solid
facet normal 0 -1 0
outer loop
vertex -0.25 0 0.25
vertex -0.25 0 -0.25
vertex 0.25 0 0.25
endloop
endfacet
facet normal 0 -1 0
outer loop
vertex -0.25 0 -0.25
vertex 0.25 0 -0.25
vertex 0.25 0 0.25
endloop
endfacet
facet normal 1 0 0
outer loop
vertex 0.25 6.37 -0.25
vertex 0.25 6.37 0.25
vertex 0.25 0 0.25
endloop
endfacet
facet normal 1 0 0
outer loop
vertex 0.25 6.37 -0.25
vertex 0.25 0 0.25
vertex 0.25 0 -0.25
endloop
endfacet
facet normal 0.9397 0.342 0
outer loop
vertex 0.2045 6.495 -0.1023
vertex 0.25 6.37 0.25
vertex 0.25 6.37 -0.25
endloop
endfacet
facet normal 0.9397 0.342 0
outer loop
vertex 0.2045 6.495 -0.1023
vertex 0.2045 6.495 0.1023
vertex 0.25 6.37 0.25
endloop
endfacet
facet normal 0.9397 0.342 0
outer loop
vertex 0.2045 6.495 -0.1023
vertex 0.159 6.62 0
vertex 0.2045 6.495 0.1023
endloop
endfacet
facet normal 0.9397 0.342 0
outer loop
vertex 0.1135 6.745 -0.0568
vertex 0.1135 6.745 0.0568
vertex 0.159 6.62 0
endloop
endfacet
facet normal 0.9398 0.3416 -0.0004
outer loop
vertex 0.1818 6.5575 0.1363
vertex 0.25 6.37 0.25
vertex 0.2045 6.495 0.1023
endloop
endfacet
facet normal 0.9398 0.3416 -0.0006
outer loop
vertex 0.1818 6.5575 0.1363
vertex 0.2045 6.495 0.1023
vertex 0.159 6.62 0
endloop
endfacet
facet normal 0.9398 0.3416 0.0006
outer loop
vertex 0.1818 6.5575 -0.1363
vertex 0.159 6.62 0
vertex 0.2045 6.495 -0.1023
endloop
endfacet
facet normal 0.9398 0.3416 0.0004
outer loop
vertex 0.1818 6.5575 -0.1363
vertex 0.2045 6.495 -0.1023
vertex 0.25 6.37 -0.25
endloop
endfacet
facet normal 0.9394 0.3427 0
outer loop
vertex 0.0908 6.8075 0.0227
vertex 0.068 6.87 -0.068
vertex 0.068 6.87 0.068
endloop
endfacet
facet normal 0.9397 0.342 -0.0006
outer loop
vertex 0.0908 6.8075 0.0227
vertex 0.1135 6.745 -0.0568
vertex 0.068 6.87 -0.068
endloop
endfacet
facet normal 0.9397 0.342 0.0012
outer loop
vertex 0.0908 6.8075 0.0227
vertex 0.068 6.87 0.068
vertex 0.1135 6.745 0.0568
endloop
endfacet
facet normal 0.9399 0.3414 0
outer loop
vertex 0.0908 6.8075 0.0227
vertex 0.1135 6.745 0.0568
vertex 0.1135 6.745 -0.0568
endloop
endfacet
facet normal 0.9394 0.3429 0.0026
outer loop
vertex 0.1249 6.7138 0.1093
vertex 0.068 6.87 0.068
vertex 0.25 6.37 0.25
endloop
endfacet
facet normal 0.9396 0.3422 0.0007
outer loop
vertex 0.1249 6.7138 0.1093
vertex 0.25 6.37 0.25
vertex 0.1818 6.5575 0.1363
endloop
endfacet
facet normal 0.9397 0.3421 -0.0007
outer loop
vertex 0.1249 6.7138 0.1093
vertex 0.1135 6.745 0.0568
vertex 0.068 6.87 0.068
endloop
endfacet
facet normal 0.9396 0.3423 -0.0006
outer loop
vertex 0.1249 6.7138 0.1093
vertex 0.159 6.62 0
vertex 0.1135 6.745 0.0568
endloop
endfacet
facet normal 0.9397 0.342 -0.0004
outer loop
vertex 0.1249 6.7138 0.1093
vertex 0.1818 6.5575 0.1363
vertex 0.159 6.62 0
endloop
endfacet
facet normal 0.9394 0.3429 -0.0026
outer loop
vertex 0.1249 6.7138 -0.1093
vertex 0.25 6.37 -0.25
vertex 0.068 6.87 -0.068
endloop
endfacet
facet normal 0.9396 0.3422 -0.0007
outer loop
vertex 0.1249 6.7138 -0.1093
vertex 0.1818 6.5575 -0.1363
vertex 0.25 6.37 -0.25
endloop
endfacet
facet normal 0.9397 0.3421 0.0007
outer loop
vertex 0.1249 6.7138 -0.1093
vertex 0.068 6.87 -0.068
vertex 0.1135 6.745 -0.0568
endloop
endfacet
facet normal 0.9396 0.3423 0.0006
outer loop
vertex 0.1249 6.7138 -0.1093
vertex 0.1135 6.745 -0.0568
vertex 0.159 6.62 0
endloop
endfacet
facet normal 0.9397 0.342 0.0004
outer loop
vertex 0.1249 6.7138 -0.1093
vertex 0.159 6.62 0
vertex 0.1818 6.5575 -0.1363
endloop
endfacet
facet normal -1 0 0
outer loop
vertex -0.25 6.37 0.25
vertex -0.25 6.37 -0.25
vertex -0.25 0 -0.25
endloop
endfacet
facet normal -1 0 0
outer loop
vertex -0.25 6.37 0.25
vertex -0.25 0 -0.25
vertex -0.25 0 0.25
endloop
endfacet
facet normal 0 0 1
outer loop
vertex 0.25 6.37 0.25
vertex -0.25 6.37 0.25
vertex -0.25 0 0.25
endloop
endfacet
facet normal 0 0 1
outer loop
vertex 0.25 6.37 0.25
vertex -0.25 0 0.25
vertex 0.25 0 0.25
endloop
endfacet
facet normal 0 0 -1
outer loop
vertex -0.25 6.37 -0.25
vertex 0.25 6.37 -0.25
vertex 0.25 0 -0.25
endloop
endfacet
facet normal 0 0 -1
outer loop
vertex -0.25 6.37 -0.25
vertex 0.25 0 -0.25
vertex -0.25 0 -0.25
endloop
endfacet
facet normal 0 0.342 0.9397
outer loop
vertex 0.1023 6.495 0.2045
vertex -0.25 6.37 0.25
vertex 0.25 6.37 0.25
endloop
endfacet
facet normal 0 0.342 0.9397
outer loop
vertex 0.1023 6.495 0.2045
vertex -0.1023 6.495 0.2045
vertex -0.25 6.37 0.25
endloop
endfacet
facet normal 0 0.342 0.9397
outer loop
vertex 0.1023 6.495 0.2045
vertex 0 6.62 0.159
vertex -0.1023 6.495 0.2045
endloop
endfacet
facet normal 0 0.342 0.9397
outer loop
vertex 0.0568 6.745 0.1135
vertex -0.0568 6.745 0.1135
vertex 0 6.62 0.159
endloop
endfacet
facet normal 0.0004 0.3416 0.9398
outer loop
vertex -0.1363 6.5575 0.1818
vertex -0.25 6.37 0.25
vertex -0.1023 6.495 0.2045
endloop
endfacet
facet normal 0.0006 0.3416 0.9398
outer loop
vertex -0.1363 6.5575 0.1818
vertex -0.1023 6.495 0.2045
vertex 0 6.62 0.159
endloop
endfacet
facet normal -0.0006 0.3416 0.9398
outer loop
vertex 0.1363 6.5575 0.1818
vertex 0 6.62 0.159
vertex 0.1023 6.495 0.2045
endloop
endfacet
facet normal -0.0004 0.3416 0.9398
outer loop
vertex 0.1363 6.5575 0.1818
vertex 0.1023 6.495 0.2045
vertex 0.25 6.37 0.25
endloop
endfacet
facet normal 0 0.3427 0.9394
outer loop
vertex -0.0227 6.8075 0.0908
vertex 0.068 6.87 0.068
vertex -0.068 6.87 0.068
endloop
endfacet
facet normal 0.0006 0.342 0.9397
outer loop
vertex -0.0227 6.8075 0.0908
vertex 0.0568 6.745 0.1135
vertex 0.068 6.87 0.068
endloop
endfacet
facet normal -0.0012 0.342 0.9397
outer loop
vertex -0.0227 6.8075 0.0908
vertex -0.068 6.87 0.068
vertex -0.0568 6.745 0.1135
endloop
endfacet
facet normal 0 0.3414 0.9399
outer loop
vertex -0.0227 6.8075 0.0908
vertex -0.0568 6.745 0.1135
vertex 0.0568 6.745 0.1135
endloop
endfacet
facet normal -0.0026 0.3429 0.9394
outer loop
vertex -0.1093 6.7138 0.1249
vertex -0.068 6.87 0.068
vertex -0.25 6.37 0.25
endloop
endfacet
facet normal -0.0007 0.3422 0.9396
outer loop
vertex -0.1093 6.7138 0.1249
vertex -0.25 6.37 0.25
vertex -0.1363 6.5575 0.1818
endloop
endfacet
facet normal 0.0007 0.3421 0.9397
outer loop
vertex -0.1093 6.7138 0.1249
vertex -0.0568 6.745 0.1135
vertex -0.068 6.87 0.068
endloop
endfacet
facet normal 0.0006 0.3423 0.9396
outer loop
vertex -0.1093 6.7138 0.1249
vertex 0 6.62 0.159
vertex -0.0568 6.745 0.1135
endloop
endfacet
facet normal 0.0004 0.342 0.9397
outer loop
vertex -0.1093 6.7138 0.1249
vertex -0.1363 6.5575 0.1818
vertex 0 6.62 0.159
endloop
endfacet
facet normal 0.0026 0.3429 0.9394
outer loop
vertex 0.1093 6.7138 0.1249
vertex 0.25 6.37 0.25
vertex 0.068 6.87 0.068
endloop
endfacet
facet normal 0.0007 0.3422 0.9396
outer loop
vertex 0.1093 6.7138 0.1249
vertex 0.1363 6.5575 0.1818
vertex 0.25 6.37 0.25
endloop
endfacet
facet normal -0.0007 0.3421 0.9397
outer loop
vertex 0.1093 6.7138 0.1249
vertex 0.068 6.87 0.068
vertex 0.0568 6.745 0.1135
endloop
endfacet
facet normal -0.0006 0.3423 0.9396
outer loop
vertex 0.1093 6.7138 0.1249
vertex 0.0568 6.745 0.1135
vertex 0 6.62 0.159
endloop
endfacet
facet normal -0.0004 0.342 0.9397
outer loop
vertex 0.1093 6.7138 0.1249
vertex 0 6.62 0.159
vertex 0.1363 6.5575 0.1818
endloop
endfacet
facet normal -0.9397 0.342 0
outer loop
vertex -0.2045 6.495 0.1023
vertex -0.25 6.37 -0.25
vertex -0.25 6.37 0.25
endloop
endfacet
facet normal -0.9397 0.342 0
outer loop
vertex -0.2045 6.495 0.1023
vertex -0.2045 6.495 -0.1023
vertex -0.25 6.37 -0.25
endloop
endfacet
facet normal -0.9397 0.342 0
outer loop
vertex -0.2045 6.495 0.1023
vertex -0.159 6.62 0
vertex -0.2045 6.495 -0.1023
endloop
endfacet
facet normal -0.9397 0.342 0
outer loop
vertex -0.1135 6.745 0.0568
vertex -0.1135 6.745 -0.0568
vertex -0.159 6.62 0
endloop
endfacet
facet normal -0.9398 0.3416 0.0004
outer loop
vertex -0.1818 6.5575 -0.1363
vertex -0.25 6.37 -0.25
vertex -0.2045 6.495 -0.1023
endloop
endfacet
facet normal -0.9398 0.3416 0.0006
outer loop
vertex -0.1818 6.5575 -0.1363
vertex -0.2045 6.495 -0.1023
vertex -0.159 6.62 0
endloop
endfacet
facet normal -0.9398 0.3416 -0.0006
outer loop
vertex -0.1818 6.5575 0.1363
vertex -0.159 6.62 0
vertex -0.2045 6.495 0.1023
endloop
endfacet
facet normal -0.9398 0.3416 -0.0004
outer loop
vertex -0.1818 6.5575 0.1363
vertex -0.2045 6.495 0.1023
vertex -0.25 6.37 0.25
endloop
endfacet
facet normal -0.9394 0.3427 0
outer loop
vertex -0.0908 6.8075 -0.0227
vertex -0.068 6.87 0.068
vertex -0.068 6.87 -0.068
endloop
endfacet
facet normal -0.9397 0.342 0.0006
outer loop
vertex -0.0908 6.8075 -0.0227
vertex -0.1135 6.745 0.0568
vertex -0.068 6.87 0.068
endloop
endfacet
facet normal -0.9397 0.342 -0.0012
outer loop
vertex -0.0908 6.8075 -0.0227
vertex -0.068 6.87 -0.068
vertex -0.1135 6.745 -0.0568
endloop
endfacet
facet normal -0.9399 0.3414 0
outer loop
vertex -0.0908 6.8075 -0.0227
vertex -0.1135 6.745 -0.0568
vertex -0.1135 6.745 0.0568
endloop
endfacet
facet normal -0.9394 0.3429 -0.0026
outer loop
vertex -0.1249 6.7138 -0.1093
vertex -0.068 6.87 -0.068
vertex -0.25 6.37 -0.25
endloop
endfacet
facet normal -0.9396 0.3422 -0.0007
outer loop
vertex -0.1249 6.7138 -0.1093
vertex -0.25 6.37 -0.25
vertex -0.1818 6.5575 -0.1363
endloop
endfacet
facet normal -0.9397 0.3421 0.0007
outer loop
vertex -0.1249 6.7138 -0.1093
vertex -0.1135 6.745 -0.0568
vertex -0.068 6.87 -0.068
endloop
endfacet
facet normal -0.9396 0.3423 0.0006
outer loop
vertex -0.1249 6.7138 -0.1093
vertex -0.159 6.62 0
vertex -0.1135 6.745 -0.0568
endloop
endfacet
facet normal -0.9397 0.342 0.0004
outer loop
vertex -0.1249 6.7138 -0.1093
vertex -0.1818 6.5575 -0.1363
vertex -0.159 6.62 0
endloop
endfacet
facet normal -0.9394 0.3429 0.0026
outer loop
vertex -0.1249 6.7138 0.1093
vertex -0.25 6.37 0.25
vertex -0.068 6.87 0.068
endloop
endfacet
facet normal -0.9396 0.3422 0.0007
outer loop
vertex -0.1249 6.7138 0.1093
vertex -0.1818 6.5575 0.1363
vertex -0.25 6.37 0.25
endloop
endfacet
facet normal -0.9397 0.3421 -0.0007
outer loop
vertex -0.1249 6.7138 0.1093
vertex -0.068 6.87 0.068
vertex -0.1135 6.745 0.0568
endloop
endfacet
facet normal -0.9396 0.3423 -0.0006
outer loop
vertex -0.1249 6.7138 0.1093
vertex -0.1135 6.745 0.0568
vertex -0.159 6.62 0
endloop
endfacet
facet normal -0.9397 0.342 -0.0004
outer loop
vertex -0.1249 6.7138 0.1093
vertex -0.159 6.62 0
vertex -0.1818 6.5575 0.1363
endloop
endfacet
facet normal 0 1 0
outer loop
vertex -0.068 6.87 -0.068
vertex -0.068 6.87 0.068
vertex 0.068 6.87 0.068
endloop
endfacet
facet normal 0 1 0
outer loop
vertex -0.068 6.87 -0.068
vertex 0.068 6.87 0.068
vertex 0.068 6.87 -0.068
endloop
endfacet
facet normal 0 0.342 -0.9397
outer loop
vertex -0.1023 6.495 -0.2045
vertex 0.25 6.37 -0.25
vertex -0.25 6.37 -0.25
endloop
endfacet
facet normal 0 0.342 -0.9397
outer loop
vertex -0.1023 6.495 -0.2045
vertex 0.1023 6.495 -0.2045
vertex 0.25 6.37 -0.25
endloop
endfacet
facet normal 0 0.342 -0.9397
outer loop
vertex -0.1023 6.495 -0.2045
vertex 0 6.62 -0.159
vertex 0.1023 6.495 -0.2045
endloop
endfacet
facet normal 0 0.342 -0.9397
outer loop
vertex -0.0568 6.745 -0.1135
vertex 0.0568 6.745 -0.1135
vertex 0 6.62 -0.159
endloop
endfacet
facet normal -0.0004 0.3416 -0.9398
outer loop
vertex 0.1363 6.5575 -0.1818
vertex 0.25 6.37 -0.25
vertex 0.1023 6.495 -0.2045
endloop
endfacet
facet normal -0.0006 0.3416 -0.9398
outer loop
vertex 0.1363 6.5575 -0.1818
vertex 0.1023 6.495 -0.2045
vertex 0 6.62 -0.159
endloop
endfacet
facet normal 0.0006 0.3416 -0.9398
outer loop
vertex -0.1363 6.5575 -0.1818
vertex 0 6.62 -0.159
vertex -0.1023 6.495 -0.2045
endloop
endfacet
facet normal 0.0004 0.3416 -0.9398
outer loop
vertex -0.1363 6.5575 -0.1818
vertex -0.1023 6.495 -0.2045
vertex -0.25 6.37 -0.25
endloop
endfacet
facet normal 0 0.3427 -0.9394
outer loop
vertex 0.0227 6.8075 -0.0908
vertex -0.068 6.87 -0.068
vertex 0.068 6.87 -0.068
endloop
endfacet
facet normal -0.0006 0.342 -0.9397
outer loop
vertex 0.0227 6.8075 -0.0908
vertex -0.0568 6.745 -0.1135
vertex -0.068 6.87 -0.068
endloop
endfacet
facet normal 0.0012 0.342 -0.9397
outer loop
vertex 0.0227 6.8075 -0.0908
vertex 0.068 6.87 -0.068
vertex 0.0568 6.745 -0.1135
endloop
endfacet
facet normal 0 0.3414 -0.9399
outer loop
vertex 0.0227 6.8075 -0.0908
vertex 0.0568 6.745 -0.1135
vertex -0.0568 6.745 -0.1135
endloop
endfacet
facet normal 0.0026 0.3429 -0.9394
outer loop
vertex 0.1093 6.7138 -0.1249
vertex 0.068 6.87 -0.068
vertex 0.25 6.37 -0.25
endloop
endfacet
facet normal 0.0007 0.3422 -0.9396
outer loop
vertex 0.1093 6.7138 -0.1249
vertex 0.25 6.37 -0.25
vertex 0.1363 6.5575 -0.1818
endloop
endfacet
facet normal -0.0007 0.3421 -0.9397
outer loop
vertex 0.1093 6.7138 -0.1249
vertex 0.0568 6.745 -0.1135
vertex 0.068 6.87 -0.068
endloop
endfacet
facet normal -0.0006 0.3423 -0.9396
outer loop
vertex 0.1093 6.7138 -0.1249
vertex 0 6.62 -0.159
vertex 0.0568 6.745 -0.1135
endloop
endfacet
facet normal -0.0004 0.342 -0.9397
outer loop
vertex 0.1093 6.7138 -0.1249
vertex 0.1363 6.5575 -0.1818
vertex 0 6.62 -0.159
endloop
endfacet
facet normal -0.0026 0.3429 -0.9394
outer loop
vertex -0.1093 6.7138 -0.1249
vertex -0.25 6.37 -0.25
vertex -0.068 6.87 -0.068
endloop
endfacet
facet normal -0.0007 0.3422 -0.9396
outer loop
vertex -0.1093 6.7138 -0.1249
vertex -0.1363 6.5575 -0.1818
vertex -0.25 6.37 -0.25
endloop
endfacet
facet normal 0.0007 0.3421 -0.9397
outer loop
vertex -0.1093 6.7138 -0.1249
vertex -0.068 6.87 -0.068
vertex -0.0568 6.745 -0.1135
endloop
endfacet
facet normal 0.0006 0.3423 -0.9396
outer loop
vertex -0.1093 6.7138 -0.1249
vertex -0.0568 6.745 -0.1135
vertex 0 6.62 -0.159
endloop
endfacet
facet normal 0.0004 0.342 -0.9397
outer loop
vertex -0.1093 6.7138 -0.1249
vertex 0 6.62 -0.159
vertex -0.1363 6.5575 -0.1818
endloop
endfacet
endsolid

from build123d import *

# Parameters (mm, degrees)
SKETCH1_W           = 0.5
SKETCH1_H           = 0.5
SKETCH3_W           = 0.5
SKETCH3_H           = 0.5
BOSS_EXTRUDE1_DEPTH = 0.5
BOSS_EXTRUDE1_TAPER = 20


with BuildPart() as part:
    # Sweep1: sweep along a path in Sketch2
    with BuildLine(Plane.XY) as sweep1_path:
        Line((0, 0), (0, 6.37))
    # Sketch1 → Sweep1 (sweep)
    with BuildSketch(Plane(origin=(0, 0, 0), x_dir=(1, 0, 0), z_dir=(0, 1, 0))):
        Rectangle(SKETCH1_W, SKETCH1_H)
    sweep(path=sweep1_path.line)

    # Sketch3 → Boss-Extrude1 (add)
    with BuildSketch(Plane(origin=(0, 6.37, 0), x_dir=(1, 0, 0), z_dir=(0, 1, 0))):
        Rectangle(SKETCH3_W, SKETCH3_H)
    extrude(amount=BOSS_EXTRUDE1_DEPTH, taper=BOSS_EXTRUDE1_TAPER)


solid = part.part
